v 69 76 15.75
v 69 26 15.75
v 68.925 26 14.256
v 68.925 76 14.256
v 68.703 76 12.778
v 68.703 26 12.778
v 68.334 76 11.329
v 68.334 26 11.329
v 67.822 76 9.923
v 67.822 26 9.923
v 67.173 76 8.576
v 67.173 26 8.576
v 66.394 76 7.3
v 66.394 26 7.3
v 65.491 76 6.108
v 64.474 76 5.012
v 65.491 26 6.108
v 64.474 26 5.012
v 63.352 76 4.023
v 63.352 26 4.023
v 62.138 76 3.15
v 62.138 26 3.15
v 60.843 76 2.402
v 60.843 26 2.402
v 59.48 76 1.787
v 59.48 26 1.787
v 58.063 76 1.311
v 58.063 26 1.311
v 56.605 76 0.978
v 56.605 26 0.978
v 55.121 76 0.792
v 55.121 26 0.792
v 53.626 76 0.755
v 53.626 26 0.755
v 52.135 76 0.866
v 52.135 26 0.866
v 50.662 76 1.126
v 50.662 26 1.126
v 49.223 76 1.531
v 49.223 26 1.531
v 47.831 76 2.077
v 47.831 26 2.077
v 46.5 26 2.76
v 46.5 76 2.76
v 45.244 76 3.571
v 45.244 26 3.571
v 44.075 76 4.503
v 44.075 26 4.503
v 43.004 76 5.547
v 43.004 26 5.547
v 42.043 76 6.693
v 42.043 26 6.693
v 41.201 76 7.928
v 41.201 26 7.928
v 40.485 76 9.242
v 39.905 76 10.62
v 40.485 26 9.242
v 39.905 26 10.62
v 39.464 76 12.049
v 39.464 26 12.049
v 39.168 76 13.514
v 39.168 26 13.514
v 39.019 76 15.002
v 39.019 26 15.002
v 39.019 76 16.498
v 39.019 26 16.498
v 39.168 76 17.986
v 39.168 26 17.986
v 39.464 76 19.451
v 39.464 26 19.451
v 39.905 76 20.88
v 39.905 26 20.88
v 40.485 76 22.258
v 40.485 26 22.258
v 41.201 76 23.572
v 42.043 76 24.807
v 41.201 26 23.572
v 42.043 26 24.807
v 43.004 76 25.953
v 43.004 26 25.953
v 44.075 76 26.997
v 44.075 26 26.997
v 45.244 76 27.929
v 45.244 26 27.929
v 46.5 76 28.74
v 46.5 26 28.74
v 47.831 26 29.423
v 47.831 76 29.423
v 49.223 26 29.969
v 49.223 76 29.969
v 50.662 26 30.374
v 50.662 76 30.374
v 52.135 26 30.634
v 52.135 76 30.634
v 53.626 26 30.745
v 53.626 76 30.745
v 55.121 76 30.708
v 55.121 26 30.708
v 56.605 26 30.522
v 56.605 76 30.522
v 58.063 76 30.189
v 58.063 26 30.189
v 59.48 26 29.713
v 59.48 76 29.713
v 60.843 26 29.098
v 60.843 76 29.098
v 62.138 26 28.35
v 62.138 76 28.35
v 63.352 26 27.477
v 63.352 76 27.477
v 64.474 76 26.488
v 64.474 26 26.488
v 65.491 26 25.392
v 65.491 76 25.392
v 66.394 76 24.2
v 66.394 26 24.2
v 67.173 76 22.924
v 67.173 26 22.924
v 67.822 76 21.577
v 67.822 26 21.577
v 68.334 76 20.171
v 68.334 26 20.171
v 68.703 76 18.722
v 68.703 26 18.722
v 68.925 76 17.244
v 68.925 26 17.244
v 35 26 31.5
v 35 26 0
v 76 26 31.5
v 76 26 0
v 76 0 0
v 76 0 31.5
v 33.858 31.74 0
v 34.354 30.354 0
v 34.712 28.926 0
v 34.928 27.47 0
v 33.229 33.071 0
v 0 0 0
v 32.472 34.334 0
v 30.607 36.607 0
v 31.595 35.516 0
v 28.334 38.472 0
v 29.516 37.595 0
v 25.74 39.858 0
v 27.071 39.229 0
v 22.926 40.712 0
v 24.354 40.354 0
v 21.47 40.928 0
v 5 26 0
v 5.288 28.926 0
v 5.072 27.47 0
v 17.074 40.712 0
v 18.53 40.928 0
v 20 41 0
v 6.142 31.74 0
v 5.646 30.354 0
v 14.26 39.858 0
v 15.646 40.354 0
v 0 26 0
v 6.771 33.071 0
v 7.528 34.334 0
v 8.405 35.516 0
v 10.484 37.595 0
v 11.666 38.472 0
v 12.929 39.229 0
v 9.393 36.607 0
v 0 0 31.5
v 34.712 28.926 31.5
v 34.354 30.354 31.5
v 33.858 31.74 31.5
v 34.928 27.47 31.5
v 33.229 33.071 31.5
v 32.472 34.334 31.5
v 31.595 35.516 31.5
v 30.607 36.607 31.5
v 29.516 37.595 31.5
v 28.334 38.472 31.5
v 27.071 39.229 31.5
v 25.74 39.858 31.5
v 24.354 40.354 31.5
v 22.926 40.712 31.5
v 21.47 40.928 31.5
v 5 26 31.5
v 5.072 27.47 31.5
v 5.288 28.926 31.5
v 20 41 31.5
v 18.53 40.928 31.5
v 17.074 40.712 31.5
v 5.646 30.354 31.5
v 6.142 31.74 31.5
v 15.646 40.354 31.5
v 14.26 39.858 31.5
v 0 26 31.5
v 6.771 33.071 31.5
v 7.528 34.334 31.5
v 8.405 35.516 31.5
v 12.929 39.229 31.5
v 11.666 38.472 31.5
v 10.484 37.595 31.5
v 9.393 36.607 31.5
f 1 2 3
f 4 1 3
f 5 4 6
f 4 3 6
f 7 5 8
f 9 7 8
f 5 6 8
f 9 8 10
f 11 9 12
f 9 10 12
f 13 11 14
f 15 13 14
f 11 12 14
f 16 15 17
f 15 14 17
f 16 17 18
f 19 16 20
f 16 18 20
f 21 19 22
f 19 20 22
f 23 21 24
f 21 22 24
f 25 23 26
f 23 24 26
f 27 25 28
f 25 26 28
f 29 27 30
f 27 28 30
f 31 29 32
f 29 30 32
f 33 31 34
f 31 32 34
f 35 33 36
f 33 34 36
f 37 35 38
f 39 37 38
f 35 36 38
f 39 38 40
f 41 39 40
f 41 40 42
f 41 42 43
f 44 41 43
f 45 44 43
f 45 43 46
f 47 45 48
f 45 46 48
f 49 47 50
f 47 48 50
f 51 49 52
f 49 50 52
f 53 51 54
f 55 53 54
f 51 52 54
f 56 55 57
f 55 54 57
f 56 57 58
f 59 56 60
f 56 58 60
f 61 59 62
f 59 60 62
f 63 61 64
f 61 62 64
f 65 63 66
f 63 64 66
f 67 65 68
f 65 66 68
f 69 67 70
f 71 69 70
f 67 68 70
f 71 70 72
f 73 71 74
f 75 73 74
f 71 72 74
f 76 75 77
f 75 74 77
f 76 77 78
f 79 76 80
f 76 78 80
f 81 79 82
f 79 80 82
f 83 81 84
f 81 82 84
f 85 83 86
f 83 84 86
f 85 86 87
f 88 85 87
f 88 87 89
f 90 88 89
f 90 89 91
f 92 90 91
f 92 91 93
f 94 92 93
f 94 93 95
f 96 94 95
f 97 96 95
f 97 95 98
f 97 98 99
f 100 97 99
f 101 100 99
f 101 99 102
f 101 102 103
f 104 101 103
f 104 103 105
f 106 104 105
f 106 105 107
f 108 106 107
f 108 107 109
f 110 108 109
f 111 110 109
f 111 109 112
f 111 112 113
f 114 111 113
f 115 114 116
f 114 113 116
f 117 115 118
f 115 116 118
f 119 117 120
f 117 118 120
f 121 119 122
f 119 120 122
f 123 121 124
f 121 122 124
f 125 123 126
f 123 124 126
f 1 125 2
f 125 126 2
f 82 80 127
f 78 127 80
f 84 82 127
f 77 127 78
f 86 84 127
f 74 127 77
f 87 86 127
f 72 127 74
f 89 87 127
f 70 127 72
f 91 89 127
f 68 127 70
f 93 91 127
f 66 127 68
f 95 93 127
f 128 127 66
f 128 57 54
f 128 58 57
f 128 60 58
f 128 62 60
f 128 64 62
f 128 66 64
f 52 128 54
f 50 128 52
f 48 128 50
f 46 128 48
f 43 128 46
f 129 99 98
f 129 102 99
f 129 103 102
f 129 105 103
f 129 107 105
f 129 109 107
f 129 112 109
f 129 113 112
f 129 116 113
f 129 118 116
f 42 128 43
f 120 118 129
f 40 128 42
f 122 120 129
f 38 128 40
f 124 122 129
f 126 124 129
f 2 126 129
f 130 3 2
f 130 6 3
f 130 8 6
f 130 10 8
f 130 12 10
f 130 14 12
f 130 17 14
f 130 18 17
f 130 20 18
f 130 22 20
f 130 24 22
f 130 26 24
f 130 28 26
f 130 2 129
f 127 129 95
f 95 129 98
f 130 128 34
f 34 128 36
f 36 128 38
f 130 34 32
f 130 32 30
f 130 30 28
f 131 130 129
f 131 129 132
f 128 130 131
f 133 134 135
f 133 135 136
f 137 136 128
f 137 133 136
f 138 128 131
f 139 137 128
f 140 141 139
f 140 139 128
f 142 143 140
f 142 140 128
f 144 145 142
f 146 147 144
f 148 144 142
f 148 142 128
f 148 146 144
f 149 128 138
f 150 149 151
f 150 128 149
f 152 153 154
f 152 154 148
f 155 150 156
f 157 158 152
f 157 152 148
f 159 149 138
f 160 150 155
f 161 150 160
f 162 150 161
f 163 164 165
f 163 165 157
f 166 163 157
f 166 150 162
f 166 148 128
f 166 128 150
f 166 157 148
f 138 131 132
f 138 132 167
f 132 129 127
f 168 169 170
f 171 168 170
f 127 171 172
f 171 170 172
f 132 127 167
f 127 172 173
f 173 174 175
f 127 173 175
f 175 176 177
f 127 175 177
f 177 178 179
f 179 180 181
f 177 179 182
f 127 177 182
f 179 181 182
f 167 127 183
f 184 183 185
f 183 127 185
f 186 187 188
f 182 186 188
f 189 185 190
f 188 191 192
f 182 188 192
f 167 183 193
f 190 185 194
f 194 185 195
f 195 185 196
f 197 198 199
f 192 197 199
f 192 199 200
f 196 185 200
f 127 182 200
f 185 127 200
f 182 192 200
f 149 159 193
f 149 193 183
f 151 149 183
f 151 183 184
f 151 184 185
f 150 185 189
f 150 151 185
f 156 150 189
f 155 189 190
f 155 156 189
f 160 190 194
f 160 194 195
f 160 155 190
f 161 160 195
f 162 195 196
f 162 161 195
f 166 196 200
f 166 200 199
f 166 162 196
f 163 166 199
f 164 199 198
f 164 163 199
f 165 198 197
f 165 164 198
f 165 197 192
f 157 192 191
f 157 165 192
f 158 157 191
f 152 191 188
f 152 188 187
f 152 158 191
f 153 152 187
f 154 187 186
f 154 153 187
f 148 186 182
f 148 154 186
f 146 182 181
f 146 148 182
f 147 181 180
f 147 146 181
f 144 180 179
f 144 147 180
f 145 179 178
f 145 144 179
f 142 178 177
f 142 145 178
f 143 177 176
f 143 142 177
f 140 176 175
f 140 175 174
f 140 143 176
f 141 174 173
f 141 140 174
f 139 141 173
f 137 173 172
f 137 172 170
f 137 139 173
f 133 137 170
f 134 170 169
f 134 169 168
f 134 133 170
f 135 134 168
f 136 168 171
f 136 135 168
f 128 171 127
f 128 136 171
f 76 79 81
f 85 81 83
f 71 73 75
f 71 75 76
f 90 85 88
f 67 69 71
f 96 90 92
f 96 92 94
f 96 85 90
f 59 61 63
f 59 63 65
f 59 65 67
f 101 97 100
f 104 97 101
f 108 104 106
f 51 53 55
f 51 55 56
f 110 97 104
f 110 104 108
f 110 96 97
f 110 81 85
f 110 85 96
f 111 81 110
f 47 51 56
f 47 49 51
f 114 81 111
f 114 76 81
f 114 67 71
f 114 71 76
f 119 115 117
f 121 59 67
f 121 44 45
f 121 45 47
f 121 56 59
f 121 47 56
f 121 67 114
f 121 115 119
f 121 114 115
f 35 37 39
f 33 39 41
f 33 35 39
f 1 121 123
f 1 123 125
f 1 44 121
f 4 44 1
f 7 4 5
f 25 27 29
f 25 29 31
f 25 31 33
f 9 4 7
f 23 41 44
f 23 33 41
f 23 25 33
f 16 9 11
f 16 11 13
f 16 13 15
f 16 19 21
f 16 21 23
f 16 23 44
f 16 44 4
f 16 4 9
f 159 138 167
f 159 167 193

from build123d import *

# Parameters (mm, degrees)
BOSS_EXTRU_1_DEPTH = 31.5
ESQUISSE2_R        = 15
BOSS_EXTRU_2_DEPTH = 50


with BuildPart() as part:
    # Esquisse1 → Boss.-Extru.1 (new body)
    with BuildSketch(Plane.XY):
        with BuildLine():
            Line((35, 26), (76, 26))
            Line((76, 26), (76, 0))
            Line((76, 0), (0, 0))
            Line((0, 0), (0, 26))
            Line((0, 26), (5, 26))
            ThreePointArc((5, 26), (20, 41), (35, 26))
        make_face()
    extrude(amount=BOSS_EXTRU_1_DEPTH)

    # Esquisse2 → Boss.-Extru.2 (add)
    with BuildSketch(Plane(origin=(0, 26, 0), x_dir=(1, 0, 0), z_dir=(0, 1, 0))):
        with Locations((54, -15.75)):
            Circle(ESQUISSE2_R)
    extrude(amount=BOSS_EXTRU_2_DEPTH)


solid = part.part
